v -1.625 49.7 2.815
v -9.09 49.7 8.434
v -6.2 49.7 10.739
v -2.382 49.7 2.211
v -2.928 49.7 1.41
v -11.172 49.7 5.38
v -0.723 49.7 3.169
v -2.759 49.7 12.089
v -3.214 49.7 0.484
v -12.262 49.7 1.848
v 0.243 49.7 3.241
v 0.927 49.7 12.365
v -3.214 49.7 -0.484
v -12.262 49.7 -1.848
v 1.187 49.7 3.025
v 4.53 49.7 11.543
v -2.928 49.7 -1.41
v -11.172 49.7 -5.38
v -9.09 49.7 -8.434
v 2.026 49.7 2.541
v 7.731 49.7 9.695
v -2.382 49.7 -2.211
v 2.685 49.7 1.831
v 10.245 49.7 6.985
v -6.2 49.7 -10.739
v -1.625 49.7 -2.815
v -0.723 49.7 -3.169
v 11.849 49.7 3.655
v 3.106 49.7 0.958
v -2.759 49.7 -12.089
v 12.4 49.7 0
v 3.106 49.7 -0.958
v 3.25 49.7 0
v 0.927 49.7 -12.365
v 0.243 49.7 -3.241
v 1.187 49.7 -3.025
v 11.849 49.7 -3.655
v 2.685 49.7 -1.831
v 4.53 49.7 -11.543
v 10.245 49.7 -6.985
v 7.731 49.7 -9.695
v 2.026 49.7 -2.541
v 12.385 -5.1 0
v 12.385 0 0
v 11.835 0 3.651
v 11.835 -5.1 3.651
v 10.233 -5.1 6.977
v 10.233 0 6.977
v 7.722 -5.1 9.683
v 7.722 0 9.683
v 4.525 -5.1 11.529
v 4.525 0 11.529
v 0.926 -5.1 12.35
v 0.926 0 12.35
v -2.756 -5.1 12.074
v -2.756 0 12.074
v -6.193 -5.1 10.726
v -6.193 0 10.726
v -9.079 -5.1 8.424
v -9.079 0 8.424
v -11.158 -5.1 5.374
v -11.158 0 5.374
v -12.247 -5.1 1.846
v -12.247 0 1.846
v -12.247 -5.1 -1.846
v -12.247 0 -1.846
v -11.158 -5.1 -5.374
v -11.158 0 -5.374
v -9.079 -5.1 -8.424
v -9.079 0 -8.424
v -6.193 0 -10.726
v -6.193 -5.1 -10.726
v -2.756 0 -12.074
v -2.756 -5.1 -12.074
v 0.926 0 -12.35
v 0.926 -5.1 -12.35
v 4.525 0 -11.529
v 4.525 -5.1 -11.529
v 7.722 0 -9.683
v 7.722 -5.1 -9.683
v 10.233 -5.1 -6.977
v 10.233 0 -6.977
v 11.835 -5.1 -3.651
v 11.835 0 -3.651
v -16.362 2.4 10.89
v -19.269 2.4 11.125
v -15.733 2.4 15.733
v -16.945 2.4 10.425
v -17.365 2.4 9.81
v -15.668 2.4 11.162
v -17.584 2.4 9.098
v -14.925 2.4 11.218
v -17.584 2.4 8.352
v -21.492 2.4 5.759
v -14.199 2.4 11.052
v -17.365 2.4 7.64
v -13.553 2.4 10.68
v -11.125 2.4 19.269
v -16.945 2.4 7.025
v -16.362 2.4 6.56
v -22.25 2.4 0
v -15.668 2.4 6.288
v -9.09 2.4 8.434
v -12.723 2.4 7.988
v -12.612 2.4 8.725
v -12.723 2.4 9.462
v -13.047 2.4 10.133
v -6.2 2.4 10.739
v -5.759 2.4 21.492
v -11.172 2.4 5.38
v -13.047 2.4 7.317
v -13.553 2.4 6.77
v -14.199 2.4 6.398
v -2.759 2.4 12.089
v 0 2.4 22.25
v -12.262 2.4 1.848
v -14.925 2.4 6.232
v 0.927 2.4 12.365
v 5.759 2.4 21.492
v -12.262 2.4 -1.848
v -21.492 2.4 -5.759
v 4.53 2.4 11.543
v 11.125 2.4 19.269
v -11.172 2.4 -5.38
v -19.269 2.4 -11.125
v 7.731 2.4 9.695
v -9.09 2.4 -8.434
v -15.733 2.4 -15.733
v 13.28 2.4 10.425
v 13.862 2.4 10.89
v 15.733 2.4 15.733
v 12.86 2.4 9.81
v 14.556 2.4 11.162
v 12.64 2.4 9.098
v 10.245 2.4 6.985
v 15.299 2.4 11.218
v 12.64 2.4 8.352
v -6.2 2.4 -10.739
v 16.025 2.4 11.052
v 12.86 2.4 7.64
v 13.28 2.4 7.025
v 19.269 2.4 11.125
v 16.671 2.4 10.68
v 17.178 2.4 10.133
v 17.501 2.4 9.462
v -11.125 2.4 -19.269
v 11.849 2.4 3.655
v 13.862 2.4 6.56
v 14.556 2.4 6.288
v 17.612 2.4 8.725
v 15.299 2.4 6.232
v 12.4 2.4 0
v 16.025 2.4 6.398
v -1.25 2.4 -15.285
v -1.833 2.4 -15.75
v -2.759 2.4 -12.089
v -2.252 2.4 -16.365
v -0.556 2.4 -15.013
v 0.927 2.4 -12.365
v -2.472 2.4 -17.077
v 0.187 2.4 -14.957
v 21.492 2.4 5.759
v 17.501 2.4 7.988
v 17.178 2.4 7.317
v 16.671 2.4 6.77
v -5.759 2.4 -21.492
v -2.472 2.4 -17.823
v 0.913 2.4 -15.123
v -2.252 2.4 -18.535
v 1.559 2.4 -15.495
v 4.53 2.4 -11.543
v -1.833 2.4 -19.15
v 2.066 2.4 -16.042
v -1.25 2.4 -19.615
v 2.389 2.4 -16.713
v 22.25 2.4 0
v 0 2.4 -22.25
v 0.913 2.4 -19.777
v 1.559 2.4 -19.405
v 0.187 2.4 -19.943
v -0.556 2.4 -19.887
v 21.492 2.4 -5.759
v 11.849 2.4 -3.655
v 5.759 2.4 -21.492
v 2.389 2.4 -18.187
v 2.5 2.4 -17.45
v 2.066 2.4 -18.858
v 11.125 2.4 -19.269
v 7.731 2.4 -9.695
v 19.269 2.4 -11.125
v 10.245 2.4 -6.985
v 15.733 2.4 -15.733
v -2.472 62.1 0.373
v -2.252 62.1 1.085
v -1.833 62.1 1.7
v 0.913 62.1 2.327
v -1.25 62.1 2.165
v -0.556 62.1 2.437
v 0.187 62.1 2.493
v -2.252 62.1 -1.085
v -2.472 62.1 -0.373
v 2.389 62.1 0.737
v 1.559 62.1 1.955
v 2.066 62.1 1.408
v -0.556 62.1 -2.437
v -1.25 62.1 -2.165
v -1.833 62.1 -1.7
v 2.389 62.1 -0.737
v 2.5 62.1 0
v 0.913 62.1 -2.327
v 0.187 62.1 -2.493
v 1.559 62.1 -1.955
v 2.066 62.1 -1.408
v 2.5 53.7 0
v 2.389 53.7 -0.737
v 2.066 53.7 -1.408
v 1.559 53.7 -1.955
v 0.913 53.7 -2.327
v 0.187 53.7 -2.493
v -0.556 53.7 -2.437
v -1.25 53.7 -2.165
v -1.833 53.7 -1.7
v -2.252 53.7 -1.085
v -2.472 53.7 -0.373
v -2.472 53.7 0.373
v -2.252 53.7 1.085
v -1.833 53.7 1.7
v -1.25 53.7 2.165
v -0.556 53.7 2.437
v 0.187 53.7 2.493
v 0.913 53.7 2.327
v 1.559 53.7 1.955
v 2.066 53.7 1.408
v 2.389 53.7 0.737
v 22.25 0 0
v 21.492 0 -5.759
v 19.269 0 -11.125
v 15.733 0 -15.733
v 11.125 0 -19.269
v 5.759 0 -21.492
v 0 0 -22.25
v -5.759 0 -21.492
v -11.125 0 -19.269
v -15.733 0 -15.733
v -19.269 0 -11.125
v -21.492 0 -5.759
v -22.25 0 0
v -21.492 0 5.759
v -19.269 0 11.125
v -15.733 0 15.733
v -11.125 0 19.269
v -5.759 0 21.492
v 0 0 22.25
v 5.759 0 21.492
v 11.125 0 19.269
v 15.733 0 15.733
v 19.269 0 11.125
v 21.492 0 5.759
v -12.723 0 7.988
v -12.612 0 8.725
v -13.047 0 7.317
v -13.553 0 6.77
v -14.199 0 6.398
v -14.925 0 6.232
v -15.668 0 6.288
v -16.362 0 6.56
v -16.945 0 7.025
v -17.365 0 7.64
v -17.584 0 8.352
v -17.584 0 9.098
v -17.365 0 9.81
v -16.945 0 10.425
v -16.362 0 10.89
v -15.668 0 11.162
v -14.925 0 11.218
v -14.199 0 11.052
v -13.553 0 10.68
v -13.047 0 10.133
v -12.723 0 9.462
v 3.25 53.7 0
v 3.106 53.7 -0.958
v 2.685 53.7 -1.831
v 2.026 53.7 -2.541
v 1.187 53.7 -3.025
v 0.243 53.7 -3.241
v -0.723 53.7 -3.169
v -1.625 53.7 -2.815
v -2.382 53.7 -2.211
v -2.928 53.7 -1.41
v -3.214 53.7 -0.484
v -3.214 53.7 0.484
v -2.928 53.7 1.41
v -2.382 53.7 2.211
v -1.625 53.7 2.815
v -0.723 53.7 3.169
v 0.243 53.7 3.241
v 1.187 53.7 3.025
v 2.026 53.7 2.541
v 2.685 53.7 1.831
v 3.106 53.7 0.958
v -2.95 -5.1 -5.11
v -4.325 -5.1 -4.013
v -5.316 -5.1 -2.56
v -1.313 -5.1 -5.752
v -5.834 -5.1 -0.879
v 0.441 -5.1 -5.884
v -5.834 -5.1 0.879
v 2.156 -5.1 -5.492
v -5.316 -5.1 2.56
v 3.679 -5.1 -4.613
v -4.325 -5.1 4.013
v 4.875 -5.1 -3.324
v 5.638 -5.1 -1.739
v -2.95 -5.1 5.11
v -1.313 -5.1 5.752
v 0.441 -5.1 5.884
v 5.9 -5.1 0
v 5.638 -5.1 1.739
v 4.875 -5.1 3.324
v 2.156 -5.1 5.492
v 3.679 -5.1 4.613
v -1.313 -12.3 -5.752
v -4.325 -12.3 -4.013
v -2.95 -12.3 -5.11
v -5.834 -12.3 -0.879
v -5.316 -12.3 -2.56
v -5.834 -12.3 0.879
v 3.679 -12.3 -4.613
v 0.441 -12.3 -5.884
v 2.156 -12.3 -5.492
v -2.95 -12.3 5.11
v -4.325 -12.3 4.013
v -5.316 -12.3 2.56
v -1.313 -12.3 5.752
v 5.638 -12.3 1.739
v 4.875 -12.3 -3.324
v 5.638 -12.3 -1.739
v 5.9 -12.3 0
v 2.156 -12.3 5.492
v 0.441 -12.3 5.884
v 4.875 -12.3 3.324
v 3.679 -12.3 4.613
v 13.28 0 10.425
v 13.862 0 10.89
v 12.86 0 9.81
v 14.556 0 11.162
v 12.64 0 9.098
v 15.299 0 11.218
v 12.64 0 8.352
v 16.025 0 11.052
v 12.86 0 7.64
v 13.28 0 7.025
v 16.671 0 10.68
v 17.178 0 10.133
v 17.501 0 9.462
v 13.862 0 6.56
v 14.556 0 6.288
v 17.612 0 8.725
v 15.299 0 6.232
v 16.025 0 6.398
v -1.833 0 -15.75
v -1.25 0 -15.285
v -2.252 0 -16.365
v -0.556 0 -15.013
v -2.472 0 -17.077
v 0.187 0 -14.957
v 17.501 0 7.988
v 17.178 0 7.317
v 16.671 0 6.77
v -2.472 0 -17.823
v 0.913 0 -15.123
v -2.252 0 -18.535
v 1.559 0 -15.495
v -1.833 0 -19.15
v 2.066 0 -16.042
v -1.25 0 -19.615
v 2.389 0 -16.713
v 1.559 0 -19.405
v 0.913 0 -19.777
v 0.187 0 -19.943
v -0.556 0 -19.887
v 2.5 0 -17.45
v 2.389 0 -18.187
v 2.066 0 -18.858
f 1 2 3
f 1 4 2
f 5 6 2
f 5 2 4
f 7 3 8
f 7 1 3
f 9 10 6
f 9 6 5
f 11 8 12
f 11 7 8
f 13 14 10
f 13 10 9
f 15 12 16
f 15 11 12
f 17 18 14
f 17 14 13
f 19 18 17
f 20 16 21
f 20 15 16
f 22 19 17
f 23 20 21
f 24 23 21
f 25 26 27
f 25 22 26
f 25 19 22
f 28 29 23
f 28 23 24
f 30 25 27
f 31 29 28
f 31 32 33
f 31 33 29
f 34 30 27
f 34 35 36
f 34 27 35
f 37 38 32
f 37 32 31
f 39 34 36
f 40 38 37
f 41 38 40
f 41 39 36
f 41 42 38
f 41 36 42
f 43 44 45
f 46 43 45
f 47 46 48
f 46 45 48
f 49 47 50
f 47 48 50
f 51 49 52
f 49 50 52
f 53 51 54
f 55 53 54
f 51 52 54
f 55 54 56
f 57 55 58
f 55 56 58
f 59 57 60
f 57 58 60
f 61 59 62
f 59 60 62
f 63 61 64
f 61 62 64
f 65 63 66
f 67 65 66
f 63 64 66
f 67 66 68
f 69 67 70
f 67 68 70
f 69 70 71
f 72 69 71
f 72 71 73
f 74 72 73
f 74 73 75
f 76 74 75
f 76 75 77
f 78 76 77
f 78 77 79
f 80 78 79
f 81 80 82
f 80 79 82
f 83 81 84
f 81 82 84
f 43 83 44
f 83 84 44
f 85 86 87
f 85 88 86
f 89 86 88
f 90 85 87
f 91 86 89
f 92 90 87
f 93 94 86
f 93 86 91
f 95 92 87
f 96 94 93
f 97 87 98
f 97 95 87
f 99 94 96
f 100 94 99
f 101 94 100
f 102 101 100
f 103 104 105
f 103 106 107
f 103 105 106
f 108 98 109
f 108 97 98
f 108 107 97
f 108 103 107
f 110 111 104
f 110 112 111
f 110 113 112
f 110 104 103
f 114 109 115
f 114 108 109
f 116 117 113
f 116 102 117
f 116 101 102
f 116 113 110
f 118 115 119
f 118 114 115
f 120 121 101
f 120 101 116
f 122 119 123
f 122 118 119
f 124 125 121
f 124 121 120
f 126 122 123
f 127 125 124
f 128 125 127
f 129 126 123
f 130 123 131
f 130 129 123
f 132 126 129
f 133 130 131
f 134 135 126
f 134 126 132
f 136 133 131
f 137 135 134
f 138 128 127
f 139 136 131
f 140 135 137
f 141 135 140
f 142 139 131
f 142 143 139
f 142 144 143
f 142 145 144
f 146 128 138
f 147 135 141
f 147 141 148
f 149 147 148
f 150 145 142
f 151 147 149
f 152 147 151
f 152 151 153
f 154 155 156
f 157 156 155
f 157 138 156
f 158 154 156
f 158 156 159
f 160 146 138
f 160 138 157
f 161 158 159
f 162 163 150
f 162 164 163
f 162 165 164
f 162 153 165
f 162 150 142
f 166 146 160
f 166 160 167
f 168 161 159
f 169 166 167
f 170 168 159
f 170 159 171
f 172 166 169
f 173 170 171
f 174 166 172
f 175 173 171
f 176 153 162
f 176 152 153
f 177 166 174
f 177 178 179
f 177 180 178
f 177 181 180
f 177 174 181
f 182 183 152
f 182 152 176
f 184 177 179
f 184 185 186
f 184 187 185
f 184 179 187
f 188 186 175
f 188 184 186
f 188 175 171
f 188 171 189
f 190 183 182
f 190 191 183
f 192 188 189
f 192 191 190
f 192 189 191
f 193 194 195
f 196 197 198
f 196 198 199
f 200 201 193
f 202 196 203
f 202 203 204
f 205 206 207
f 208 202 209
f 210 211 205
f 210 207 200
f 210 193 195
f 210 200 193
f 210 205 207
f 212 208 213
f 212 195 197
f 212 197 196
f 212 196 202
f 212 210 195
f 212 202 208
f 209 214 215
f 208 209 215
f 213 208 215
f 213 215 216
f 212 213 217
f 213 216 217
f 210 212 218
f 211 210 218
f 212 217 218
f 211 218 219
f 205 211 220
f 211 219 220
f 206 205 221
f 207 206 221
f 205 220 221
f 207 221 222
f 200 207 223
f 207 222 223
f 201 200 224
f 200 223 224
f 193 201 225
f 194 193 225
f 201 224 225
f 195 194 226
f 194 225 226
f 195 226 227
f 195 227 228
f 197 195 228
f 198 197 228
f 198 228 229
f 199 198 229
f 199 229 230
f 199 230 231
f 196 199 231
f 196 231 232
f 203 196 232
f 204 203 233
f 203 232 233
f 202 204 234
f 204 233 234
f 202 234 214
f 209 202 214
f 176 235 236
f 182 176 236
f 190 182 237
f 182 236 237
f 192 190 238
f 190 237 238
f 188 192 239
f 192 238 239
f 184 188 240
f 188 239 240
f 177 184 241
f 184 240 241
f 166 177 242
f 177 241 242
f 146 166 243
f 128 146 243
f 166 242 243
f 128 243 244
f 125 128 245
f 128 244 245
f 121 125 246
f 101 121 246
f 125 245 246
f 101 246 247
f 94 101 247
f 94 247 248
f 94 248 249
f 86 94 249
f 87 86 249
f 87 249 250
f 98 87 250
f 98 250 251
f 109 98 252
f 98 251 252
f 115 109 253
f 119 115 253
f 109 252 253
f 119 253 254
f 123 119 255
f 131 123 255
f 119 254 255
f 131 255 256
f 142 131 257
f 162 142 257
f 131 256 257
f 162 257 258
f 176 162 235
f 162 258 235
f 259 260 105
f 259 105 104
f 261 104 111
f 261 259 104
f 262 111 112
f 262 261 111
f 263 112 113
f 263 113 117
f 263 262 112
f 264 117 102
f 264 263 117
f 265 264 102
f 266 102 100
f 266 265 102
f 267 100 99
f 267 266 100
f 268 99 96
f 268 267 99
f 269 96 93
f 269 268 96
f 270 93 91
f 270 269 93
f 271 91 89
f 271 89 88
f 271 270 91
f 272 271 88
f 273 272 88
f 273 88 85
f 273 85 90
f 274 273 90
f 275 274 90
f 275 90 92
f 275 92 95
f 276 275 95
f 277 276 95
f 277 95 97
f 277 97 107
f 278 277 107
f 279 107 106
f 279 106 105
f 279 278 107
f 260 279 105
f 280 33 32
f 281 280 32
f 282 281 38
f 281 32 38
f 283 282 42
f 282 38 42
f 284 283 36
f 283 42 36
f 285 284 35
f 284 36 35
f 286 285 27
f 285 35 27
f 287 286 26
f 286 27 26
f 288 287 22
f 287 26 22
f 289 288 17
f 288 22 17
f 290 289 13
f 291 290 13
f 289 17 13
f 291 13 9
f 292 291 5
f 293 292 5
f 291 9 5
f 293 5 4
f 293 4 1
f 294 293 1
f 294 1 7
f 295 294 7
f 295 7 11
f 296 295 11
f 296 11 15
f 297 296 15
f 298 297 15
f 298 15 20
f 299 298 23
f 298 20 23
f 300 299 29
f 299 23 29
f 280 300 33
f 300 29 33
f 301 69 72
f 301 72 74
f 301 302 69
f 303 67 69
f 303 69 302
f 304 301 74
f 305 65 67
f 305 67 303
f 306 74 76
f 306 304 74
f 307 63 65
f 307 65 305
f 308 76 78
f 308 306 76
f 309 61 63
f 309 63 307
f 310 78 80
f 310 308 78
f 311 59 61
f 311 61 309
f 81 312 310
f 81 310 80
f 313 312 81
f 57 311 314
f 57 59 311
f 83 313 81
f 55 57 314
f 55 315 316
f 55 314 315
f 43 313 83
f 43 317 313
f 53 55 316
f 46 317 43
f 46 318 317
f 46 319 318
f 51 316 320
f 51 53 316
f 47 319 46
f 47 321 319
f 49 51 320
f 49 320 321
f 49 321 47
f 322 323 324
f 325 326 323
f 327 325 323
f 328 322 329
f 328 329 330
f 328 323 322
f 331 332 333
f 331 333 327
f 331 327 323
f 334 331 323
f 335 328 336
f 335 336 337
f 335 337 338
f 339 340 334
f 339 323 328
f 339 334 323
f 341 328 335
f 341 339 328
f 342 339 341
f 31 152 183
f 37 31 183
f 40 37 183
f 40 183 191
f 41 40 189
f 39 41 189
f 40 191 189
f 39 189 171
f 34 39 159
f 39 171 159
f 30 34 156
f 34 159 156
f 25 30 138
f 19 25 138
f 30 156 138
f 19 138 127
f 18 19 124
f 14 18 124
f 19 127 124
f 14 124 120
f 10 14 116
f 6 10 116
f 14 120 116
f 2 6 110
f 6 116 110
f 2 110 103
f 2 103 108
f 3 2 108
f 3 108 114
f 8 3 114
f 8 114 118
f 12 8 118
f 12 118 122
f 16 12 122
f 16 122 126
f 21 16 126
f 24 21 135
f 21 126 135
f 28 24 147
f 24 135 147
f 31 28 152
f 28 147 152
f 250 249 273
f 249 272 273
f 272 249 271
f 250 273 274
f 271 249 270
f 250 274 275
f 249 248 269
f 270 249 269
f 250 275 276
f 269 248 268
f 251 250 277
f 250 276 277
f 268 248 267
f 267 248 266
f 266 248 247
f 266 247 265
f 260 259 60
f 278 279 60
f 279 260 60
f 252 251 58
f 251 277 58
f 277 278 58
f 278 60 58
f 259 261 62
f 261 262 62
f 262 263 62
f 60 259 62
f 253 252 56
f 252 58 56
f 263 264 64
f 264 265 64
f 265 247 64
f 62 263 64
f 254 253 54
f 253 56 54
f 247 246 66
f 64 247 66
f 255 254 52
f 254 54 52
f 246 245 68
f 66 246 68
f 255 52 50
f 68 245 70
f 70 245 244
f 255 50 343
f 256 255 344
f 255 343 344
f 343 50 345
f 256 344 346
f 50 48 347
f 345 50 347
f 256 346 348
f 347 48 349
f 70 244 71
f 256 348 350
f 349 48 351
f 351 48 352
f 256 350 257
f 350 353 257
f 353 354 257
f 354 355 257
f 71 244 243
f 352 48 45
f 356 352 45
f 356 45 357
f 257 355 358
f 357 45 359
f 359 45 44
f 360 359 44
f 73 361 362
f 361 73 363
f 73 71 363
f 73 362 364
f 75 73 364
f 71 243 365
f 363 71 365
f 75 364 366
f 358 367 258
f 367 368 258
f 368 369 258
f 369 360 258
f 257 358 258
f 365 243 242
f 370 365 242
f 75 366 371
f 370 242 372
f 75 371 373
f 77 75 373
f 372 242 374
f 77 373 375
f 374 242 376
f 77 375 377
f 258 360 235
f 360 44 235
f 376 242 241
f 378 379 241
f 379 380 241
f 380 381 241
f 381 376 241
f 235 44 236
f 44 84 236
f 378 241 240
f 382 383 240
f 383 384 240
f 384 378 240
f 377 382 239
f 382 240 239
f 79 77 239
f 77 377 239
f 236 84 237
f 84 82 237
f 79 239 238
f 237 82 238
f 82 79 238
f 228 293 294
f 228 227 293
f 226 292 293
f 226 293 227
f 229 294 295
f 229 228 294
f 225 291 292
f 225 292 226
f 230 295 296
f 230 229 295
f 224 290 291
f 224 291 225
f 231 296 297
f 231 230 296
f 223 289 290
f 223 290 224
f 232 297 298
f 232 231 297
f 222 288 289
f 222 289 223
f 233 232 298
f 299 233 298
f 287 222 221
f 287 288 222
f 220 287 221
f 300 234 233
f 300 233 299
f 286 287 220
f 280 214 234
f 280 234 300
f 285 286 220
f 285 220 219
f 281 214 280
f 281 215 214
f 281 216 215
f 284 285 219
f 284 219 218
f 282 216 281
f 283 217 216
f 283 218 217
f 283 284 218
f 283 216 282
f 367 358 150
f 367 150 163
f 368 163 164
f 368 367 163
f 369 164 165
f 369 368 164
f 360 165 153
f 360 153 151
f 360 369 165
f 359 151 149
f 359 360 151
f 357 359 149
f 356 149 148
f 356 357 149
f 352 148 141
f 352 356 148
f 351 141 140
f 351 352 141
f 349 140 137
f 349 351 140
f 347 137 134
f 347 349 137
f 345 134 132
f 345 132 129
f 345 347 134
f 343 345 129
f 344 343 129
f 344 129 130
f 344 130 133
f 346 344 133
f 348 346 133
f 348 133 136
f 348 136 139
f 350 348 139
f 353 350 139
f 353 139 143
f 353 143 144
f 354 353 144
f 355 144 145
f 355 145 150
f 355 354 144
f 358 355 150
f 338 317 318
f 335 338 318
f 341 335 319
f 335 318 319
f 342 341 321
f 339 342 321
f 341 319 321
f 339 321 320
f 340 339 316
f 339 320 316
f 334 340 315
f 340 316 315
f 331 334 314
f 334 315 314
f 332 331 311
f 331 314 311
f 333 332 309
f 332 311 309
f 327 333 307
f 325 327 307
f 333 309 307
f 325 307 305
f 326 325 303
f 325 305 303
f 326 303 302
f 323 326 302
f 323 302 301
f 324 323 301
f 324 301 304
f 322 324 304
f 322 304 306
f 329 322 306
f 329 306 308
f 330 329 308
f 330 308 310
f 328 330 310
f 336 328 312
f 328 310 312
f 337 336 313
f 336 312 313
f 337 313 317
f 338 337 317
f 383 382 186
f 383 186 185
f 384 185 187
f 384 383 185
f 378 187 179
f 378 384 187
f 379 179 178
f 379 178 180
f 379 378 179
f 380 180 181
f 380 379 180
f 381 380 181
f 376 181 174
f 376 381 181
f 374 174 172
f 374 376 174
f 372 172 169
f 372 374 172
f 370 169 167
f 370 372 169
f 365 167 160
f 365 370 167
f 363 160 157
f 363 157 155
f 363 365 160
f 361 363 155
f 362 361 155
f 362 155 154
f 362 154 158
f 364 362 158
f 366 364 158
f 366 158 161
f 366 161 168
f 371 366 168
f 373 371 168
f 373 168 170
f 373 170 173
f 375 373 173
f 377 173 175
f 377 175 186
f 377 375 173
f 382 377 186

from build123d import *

# Parameters (mm, degrees)
SKETCH2_R           = 22.25
SKETCH2_R_2         = 2.5
BOSS_EXTRUDE1_DEPTH = 2.4
SKETCH3_R           = 12.4
BOSS_EXTRUDE2_DEPTH = 47.3
SKETCH4_R           = 3.25
BOSS_EXTRUDE3_DEPTH = 4
SKETCH5_R           = 2.5
BOSS_EXTRUDE4_DEPTH = 8.4
SKETCH6_R           = 12.385
BOSS_EXTRUDE5_DEPTH = 5.1
SKETCH7_R           = 5.9
BOSS_EXTRUDE6_DEPTH = 7.2


with BuildPart() as part:
    # Sketch2 → Boss-Extrude1 (new body)
    with BuildSketch(Plane(origin=(0, 0, 0), x_dir=(1, 0, 0), z_dir=(0, 1, 0))):
        Circle(SKETCH2_R)
        with Locations((0, 17.45)):
            Circle(SKETCH2_R_2, mode=Mode.SUBTRACT)
        with Locations((15.112143296, -8.725)):
            Circle(SKETCH2_R_2, mode=Mode.SUBTRACT)
        with Locations((-15.112143296, -8.725)):
            Circle(SKETCH2_R_2, mode=Mode.SUBTRACT)
    extrude(amount=BOSS_EXTRUDE1_DEPTH)

    # Sketch3 → Boss-Extrude2 (add)
    with BuildSketch(Plane(origin=(0, 2.4, 0), x_dir=(1, 0, 0), z_dir=(0, 1, 0))):
        Circle(SKETCH3_R)
    extrude(amount=BOSS_EXTRUDE2_DEPTH)

    # Sketch4 → Boss-Extrude3 (add)
    with BuildSketch(Plane(origin=(0, 49.7, 0), x_dir=(1, 0, 0), z_dir=(0, 1, 0))):
        Circle(SKETCH4_R)
    extrude(amount=BOSS_EXTRUDE3_DEPTH)

    # Sketch5 → Boss-Extrude4 (add)
    with BuildSketch(Plane(origin=(0, 53.7, 0), x_dir=(1, 0, 0), z_dir=(0, 1, 0))):
        Circle(SKETCH5_R)
    extrude(amount=BOSS_EXTRUDE4_DEPTH)

    # Sketch6 → Boss-Extrude5 (add)
    with BuildSketch(Plane.XZ):
        Circle(SKETCH6_R)
    extrude(amount=BOSS_EXTRUDE5_DEPTH)

    # Sketch7 → Boss-Extrude6 (add)
    with BuildSketch(Plane.XZ.offset(5.1)):
        Circle(SKETCH7_R)
    extrude(amount=BOSS_EXTRUDE6_DEPTH)


solid = part.part
